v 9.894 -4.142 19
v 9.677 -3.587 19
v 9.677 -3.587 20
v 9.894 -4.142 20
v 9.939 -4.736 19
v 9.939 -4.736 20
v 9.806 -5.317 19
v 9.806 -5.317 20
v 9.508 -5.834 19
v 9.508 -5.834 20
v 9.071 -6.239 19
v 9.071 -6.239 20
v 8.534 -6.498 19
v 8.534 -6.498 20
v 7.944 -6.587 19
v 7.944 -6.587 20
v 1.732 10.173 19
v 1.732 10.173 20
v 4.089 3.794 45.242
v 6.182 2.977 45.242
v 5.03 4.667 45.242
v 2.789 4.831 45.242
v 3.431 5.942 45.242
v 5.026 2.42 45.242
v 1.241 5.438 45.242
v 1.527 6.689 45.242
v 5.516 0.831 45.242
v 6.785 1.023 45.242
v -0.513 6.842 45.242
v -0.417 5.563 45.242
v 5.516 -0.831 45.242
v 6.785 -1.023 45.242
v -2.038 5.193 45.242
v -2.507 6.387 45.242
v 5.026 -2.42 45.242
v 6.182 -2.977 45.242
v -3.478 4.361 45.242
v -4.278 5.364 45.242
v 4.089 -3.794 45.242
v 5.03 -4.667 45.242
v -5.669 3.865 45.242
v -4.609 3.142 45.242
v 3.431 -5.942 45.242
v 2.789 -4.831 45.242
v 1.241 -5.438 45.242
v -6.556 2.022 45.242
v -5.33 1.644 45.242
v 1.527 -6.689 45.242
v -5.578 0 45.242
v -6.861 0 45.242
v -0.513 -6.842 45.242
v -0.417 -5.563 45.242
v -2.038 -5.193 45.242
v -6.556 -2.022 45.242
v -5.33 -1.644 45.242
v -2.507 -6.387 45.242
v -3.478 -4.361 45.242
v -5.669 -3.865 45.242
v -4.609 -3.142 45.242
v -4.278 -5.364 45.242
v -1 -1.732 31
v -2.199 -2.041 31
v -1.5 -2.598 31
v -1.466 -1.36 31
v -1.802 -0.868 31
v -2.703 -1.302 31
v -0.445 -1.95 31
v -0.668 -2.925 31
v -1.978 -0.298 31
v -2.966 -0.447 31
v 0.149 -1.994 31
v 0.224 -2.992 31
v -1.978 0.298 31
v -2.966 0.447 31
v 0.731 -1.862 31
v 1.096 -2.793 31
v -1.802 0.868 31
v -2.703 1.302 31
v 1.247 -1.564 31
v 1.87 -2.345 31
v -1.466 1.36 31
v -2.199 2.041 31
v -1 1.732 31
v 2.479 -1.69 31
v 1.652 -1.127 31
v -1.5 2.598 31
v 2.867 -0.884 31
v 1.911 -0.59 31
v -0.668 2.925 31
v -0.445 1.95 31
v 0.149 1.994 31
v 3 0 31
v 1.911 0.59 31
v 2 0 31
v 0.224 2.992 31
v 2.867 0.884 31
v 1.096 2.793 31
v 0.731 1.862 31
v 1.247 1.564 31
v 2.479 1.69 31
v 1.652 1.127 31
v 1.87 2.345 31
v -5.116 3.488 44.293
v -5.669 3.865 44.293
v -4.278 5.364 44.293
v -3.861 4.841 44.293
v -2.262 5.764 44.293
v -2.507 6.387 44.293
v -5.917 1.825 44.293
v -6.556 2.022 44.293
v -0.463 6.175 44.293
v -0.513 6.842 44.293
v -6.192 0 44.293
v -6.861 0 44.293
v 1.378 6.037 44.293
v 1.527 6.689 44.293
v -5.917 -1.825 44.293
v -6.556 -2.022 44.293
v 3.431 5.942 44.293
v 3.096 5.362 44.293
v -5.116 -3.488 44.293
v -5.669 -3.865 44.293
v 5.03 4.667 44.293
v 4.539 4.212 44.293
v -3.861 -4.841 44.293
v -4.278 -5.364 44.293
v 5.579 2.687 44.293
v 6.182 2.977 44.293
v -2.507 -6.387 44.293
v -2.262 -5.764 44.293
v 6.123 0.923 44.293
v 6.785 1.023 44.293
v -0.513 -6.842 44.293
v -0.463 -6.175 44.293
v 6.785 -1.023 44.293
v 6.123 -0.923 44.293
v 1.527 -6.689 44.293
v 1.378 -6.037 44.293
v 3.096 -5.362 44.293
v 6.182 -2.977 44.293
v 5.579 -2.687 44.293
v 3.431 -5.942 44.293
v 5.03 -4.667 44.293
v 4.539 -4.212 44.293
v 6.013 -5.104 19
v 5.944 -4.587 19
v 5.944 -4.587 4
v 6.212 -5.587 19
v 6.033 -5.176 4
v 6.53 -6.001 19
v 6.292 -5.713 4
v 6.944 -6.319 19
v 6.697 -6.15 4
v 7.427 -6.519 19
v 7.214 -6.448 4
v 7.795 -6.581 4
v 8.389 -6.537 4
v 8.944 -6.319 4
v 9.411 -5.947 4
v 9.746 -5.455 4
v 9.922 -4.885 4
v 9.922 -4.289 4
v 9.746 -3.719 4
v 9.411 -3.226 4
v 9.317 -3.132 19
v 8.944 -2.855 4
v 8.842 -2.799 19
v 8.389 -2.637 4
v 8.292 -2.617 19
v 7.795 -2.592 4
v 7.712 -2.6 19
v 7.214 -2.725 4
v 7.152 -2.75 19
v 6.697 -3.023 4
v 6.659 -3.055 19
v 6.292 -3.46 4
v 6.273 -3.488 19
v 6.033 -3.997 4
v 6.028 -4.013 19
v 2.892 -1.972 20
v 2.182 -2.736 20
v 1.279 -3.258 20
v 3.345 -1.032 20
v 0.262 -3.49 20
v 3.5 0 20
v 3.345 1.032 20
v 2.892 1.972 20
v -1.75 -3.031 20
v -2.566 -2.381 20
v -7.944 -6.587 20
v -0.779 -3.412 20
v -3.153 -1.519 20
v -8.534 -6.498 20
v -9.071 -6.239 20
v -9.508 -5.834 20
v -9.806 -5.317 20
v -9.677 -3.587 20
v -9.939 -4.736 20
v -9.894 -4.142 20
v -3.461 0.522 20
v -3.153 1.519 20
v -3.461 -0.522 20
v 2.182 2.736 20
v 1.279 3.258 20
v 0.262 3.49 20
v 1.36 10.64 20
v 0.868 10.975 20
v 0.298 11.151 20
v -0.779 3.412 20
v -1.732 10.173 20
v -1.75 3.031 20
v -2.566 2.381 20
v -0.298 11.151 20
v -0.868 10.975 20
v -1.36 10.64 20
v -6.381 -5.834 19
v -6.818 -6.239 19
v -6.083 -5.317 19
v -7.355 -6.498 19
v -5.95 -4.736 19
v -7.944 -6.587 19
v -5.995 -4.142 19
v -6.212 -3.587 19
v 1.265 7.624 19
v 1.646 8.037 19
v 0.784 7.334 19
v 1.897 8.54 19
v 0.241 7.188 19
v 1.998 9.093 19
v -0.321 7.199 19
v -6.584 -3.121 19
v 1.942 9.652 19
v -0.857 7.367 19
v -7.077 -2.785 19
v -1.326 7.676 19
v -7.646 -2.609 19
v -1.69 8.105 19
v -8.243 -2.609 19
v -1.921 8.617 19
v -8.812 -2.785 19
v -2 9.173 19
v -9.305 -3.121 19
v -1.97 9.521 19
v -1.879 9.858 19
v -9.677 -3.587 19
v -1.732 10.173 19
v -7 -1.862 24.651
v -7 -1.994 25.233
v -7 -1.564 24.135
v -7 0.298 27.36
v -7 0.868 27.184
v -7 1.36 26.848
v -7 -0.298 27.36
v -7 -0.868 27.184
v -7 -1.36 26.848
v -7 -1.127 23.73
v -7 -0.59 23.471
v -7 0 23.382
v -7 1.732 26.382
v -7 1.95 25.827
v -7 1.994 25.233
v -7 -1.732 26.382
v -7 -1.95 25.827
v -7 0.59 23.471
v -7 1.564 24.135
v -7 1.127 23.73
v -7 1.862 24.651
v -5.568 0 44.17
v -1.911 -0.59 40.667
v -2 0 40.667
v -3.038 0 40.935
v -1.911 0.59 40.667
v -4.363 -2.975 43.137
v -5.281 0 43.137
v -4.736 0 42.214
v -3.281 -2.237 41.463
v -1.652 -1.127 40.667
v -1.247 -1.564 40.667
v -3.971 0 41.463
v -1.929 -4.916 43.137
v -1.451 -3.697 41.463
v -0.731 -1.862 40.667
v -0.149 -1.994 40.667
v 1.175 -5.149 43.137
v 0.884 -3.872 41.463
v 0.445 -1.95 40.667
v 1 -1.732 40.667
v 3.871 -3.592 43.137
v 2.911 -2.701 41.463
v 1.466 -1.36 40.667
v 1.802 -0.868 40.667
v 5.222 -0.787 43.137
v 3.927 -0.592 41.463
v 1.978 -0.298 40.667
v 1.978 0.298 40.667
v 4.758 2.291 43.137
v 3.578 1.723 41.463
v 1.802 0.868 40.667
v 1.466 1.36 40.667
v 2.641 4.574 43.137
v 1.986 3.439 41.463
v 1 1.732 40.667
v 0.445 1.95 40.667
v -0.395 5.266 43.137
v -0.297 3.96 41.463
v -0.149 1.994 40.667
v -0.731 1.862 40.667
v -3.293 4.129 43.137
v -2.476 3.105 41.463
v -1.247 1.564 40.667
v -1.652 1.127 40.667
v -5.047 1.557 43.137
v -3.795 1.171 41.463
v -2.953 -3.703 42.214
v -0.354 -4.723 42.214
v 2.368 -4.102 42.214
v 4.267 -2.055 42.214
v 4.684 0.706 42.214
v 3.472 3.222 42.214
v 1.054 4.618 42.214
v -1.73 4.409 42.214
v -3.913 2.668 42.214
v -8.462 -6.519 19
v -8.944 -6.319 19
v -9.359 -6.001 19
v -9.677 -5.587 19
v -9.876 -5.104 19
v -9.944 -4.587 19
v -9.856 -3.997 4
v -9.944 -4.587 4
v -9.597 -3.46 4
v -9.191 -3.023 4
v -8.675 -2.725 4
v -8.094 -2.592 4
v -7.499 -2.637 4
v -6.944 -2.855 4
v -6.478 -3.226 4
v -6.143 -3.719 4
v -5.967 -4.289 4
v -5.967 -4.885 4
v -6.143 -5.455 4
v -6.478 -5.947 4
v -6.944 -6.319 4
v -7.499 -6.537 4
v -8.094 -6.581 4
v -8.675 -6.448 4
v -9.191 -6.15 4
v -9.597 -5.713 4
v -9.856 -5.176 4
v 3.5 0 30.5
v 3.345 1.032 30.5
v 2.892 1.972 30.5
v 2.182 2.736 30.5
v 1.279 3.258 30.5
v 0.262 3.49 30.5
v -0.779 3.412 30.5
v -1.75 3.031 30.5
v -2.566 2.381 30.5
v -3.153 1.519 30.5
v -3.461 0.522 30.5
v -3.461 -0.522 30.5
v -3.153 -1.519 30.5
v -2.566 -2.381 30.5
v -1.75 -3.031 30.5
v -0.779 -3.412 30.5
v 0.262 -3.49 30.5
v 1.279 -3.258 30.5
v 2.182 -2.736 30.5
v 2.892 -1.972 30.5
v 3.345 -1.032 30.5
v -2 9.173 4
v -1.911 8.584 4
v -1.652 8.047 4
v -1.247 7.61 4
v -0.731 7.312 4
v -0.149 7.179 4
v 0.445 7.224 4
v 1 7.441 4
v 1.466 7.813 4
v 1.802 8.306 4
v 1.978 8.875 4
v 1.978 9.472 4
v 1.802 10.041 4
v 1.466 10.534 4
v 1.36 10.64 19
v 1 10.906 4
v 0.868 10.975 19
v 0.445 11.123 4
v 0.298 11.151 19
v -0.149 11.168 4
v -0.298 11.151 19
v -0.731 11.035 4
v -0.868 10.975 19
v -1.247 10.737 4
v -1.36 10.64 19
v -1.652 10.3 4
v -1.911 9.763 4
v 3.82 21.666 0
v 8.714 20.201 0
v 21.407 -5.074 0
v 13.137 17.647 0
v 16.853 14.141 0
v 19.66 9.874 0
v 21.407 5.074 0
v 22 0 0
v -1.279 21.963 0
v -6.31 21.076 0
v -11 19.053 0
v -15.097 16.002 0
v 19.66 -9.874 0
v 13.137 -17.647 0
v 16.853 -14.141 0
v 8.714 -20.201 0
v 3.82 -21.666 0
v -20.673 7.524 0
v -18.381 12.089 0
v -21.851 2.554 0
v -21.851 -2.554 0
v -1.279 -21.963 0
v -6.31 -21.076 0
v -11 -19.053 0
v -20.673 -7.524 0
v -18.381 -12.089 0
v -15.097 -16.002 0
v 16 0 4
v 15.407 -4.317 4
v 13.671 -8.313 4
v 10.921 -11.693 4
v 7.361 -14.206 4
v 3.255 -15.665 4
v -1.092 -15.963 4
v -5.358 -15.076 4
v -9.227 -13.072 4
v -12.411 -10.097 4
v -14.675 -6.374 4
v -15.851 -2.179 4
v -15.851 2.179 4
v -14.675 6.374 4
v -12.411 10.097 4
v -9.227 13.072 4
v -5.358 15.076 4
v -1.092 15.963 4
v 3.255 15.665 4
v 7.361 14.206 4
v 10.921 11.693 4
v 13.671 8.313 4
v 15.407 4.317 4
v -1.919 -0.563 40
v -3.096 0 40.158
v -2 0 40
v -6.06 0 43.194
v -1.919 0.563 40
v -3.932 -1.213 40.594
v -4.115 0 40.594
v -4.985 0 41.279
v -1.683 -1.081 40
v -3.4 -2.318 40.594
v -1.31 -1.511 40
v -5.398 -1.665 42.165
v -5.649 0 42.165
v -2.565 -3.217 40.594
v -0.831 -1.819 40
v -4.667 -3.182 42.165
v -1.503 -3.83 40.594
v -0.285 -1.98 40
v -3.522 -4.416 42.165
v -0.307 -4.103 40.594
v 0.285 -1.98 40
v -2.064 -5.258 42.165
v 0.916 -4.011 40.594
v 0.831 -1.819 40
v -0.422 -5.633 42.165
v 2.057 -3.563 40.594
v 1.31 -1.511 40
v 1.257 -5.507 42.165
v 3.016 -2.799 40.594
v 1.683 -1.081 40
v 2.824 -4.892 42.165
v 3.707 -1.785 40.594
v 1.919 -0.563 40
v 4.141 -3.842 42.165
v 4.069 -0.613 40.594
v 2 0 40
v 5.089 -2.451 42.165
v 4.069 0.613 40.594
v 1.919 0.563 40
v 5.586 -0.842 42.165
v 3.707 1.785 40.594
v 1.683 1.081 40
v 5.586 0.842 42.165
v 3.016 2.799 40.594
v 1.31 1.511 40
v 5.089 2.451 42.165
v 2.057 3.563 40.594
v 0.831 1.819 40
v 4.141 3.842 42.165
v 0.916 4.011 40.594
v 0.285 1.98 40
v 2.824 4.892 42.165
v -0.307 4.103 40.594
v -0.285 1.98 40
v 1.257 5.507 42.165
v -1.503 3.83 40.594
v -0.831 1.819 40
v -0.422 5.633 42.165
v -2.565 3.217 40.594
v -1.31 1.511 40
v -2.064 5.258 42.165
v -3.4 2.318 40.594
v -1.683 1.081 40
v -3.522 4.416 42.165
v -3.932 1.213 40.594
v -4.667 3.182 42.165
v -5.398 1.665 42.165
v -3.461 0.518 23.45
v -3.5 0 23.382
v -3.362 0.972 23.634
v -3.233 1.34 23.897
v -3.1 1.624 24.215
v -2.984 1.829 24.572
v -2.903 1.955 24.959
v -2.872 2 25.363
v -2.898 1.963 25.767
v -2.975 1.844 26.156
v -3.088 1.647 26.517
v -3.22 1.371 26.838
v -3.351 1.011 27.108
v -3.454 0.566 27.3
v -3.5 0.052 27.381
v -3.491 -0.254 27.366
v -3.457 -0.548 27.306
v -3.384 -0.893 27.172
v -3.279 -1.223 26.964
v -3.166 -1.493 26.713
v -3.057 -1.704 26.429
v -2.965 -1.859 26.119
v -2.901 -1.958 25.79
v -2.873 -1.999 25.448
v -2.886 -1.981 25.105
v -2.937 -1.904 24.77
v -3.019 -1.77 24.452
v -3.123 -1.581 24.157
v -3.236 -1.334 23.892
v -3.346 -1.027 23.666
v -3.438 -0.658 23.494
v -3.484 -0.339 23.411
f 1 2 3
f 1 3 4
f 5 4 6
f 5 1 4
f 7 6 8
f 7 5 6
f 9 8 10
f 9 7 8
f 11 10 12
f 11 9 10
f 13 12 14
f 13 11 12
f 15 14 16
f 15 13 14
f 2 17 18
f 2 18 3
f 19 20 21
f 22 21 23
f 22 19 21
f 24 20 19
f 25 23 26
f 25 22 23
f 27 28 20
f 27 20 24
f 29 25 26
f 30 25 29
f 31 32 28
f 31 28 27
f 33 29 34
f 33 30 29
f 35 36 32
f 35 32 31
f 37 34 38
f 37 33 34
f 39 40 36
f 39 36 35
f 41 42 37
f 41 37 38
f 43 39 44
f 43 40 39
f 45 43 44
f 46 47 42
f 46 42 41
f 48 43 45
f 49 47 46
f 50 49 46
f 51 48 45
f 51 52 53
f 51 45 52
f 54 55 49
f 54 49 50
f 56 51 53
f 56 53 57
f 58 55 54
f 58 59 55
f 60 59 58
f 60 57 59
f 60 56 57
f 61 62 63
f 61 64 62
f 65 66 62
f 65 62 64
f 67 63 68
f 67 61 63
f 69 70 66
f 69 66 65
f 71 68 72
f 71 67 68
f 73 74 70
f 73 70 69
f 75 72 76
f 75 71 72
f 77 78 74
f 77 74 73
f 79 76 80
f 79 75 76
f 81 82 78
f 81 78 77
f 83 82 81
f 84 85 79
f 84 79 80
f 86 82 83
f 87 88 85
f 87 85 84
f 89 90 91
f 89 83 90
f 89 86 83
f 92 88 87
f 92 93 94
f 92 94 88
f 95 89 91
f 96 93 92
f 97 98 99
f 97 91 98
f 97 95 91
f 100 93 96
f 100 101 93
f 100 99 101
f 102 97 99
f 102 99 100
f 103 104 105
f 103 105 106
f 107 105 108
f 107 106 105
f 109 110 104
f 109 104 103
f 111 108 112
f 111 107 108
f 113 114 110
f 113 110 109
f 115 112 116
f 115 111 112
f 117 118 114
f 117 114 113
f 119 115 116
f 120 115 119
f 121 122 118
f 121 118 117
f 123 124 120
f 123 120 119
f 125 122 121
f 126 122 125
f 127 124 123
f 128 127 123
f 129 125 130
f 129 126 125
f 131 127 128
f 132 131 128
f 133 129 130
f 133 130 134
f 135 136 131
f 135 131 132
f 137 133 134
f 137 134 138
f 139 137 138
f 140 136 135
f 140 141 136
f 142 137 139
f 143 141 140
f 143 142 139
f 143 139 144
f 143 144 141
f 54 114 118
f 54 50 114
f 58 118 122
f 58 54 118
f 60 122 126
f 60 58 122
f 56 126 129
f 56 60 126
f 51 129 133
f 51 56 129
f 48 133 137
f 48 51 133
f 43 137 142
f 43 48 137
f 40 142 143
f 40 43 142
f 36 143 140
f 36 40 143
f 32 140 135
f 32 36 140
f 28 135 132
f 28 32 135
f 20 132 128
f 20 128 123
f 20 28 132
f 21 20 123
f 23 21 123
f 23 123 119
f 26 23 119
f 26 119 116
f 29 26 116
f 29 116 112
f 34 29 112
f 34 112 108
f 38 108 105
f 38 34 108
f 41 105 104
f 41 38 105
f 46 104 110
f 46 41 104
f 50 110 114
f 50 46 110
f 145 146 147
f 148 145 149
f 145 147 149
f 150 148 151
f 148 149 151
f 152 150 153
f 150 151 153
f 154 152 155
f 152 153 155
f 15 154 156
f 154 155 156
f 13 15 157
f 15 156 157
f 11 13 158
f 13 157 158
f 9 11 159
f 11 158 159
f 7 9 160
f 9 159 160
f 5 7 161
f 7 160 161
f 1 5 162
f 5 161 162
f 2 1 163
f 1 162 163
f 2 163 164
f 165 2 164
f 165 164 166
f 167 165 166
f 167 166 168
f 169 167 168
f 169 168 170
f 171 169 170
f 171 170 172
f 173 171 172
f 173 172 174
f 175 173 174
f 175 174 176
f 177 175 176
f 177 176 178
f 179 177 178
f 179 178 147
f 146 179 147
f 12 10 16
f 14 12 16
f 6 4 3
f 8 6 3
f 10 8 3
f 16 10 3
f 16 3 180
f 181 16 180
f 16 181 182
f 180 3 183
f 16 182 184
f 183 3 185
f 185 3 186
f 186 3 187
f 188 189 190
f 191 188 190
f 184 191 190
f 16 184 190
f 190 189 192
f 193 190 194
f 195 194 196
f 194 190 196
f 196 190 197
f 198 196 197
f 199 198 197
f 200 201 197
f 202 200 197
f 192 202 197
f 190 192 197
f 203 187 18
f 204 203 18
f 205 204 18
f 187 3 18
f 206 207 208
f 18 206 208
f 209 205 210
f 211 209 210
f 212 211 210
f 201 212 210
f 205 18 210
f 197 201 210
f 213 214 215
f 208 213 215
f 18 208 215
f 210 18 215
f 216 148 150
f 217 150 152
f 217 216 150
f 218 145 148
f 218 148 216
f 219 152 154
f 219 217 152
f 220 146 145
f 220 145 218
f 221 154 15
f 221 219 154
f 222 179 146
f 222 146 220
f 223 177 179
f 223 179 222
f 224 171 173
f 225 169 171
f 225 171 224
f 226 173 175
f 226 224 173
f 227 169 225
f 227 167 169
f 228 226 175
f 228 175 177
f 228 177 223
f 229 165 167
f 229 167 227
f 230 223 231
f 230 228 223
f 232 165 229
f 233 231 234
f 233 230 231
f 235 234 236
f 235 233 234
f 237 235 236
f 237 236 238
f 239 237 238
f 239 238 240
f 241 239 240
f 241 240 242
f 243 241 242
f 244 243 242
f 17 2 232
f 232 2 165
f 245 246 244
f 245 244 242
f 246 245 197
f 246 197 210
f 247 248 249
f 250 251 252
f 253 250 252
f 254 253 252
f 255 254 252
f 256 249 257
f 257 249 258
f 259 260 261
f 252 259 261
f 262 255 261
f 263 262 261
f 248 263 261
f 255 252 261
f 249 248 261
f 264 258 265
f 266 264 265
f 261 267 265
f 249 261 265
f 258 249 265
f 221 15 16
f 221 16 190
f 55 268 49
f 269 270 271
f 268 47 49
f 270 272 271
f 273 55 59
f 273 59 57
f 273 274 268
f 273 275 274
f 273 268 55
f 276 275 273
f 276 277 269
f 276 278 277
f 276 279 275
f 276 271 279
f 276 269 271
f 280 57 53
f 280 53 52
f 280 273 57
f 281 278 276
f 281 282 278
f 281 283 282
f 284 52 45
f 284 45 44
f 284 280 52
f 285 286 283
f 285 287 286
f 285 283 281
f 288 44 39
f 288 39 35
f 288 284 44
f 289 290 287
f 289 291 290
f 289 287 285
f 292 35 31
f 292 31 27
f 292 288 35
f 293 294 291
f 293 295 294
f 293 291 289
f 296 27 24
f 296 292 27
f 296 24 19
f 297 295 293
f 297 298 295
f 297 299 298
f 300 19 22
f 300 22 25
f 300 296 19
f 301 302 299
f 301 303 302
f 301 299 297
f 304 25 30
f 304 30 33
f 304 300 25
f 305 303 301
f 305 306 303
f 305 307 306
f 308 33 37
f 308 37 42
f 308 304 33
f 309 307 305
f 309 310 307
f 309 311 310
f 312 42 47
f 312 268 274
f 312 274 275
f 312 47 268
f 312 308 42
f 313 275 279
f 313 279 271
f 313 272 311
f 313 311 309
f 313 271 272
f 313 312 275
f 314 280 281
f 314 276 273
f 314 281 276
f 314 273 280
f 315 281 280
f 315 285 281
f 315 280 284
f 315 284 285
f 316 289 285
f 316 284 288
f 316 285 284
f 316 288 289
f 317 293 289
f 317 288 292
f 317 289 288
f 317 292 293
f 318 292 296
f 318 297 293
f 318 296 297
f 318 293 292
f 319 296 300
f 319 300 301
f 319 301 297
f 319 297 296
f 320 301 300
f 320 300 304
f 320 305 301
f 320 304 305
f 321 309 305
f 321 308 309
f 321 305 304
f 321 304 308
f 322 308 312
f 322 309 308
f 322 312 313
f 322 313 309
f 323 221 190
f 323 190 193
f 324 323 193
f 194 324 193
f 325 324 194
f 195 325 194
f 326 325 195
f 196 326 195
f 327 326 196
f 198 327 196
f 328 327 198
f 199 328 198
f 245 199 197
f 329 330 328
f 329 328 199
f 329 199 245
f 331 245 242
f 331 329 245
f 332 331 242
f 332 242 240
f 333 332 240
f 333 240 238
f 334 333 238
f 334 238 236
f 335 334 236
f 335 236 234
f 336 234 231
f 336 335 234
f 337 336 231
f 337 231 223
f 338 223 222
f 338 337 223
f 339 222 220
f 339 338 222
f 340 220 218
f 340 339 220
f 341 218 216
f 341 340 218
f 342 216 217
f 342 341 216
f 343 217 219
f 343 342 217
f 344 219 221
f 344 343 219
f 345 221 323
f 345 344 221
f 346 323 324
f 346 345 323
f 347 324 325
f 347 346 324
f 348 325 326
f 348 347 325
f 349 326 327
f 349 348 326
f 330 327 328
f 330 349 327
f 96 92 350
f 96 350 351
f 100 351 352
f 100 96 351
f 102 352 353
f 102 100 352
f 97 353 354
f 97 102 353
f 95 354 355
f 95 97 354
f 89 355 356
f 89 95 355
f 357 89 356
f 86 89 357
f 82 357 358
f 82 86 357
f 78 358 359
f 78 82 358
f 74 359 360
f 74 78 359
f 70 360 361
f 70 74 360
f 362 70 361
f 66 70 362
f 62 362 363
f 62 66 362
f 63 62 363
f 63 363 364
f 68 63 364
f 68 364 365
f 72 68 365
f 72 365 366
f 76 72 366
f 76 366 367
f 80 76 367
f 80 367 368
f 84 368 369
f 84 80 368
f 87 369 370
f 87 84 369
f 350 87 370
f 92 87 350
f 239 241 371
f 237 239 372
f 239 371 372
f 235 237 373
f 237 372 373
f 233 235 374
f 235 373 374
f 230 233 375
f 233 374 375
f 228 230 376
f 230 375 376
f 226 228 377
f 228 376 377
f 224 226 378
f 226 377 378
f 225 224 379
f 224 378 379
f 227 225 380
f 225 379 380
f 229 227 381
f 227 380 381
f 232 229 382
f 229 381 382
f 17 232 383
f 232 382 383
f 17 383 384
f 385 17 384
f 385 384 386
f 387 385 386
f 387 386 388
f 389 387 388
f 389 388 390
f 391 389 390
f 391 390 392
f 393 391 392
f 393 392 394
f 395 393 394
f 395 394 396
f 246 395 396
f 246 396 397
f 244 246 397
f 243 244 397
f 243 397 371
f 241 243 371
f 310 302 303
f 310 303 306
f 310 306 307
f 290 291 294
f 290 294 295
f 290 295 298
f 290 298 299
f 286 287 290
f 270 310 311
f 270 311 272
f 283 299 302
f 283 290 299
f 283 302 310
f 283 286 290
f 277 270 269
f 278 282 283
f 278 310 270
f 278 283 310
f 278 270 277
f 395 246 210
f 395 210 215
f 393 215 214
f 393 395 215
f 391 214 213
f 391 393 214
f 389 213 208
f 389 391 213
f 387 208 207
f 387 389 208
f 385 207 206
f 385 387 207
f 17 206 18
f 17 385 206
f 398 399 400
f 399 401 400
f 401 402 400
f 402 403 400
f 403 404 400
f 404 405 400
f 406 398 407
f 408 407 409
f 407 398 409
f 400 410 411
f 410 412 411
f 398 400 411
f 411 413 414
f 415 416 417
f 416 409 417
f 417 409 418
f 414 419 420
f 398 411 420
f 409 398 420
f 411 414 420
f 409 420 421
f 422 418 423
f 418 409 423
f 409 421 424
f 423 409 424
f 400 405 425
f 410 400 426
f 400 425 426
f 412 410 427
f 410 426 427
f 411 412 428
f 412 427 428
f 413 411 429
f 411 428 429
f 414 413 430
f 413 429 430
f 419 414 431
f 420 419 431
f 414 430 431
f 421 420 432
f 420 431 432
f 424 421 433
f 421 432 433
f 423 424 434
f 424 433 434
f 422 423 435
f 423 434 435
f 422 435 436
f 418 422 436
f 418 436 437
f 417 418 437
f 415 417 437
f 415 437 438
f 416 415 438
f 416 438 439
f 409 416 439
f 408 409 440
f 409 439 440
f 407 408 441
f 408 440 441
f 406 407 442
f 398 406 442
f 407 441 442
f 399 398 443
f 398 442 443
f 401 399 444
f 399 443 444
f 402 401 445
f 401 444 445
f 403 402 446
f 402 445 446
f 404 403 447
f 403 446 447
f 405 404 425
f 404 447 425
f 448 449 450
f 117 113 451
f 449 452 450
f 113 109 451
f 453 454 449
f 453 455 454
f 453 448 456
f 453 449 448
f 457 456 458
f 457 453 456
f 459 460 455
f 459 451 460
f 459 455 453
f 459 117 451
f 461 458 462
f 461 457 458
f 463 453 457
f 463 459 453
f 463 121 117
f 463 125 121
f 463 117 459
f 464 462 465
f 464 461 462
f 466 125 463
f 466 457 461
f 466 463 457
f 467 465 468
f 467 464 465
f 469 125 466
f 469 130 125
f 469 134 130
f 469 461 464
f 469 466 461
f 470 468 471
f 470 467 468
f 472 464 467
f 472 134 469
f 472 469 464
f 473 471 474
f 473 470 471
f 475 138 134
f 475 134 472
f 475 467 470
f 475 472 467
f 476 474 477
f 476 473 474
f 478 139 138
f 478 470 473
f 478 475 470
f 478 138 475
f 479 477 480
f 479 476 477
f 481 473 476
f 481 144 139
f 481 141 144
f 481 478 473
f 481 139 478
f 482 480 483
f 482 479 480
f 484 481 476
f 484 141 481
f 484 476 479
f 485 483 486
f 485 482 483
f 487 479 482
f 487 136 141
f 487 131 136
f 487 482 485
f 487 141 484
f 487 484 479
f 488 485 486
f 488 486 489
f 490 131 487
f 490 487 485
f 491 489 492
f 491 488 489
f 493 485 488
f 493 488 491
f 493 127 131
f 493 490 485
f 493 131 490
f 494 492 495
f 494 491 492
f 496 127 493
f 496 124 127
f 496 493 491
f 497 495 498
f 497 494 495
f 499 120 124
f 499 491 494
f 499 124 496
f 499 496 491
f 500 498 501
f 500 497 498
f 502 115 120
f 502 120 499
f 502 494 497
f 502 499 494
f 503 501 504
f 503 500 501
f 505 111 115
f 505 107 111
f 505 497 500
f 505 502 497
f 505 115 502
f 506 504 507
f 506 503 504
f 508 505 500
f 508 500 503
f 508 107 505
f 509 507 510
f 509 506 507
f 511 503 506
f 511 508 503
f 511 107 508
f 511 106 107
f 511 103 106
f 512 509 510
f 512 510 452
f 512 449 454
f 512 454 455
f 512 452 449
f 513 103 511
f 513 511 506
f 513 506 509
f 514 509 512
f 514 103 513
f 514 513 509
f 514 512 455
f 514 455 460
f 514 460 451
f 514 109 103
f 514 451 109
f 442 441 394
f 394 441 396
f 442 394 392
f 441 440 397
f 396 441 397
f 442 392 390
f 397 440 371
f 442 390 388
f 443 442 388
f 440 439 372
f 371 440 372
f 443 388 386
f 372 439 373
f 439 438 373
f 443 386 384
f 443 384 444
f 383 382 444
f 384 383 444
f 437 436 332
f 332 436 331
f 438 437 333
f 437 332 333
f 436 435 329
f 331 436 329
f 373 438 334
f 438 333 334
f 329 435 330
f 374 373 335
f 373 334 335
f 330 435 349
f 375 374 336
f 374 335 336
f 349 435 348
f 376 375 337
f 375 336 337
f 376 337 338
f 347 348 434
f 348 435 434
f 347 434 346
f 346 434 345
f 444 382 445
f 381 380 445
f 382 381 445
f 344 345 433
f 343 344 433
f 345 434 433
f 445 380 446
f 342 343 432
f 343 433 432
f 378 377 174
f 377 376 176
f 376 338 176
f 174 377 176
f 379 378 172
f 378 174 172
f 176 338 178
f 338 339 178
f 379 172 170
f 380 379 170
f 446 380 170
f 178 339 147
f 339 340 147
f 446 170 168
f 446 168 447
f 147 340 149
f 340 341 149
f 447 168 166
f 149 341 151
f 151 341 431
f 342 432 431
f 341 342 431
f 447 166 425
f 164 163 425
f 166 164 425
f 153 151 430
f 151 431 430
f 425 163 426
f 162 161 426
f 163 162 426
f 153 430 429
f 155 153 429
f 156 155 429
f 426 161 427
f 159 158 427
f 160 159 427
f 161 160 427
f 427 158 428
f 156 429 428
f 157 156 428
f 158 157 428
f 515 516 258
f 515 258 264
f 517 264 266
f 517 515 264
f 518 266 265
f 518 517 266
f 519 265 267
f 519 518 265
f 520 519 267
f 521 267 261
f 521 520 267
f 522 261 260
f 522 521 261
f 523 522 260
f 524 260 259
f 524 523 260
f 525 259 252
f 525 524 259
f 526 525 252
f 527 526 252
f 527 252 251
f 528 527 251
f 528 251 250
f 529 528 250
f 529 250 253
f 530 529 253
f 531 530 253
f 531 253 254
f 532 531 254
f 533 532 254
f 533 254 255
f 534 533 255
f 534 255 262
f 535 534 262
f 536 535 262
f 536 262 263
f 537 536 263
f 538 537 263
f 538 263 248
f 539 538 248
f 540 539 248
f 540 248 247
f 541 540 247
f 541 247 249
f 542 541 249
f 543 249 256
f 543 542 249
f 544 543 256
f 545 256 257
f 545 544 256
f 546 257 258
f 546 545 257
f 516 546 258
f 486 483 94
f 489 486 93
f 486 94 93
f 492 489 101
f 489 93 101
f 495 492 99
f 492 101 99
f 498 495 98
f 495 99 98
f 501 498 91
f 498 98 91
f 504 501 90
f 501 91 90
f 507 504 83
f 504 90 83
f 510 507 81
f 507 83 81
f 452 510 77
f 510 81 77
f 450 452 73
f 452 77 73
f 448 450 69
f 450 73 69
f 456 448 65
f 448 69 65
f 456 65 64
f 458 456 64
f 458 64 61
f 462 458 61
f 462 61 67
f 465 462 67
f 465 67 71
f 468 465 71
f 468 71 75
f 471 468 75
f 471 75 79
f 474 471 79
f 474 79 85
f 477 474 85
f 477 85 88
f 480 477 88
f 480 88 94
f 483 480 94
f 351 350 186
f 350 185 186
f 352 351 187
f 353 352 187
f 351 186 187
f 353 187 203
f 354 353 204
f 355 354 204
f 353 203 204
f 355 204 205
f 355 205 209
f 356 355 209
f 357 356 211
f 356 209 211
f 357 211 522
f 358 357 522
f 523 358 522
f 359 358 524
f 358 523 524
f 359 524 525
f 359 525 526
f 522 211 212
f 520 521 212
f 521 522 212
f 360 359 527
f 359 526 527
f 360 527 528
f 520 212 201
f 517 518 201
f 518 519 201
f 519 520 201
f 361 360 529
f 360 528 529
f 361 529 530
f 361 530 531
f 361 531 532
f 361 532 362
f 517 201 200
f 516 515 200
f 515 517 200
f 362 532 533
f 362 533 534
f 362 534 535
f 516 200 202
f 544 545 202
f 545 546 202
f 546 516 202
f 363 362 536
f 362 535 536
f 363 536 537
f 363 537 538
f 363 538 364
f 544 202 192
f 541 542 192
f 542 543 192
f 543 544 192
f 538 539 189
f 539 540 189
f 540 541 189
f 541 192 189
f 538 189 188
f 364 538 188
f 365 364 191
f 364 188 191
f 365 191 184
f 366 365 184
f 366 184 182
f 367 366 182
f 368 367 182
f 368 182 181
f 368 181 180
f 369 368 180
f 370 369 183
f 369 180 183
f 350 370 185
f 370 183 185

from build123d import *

# Parameters (mm, degrees)
SKETCH3_R           = 2
BOSS_EXTRUDE1_DEPTH = 15
BOSS_EXTRUDE2_DEPTH = 1
SKETCH6_R           = 3.5
BOSS_EXTRUDE3_DEPTH = 11
SKETCH7_R           = 2
BOSS_EXTRUDE4_DEPTH = 9
CHAMFER2_SIZE       = 0.5
SKETCH9_R           = 2
BOSS_EXTRUDE5_DEPTH = 7


with BuildPart() as part:
    # Sketch2 → Revolve1 (revolve)
    with BuildSketch(Plane(origin=(0, 0, 0), x_dir=(0, 0, -1), z_dir=(1, 0, 0)), mode=Mode.PRIVATE) as revolve1_sk:
        Polygon((0, 0), (0, 22), (-4, 16), (-4, 0), align=None)
    revolve(revolve1_sk.sketch.rotate(Axis((0, 0, 4), (0, 0, -1)), 90), axis=Axis((0, 0, 4), (0, 0, -1)))

    # Sketch3 → Boss-Extrude1 (add)
    with BuildSketch(Plane.XY.offset(4)):
        with Locations(Location((7.94445625, -4.586733955, 0), (0, 0, 180))):
            Circle(SKETCH3_R)
        with Locations(Location((-7.94445625, -4.586733955, 0), (0, 0, 180))):
            Circle(SKETCH3_R)
        with Locations(Location((0, 9.173467909, 0), (0, 0, 180))):
            Circle(SKETCH3_R)
    extrude(amount=BOSS_EXTRUDE1_DEPTH)

    # Sketch4 → Boss-Extrude2 (add)
    with BuildSketch(Plane.XY.offset(19)):
        with BuildLine():
            Line((1.732050808, 10.173467909), (9.676507058, -3.586733955))
            ThreePointArc((9.676507058, -3.586733955), (9.676507058, -5.586733955), (7.94445625, -6.586733955))
            Line((7.94445625, -6.586733955), (-7.94445625, -6.586733955))
            ThreePointArc((-7.94445625, -6.586733955), (-9.676507058, -5.586733955), (-9.676507058, -3.586733955))
            Line((-9.676507058, -3.586733955), (-1.732050808, 10.173467909))
            ThreePointArc((-1.732050808, 10.173467909), (0, 11.173467909), (1.732050808, 10.173467909))
        make_face()
    extrude(amount=BOSS_EXTRUDE2_DEPTH)

    # Sketch6 → Boss-Extrude3 (add)
    with BuildSketch(Plane.XY.offset(20)):
        Circle(SKETCH6_R)
    extrude(amount=BOSS_EXTRUDE3_DEPTH)

    # Sketch7 → Boss-Extrude4 (add)
    with BuildSketch(Plane.XY.offset(31)):
        Circle(SKETCH7_R)
    extrude(amount=BOSS_EXTRUDE4_DEPTH)

    # Chamfer2
    chamfer2_edges = [part.edges().sort_by_distance(p)[0] for p in [
        (-3.5, 0, 31),
    ]]
    chamfer(chamfer2_edges, length=CHAMFER2_SIZE)

    # Sketch8 → Revolve2 (revolve)
    with BuildSketch(Plane(origin=(0, 0, 0), x_dir=(1, 0, 0), z_dir=(0, 1, 0)), mode=Mode.PRIVATE) as revolve2_sk:
        with BuildLine():
            Line((0, -40), (2, -40))
            ThreePointArc((2, -40), (4.985127596, -41.278519641), (6.191881653, -44.293373514))
            Line((6.191881653, -44.293373514), (6.861274265, -44.293373514))
            Line((6.861274265, -44.293373514), (6.861274265, -45.241679714))
            Line((6.861274265, -45.241679714), (5.57827176, -45.241679714))
            ThreePointArc((5.57827176, -45.241679714), (4.736480165, -42.213503946), (2, -40.66749687))
            Line((2, -40.66749687), (0, -40.66749687))
            Line((0, -40.66749687), (0, -40))
        make_face()
    revolve(revolve2_sk.sketch.rotate(Axis((0, 0, 40), (0, 0, 1)), 180), axis=Axis((0, 0, 40), (0, 0, 1)))

    # Sketch9 → Boss-Extrude5 (add)
    with BuildSketch(Plane(origin=(0, 0, 0), x_dir=(0, 0, -1), z_dir=(1, 0, 0))):
        with Locations((-25.382084378, 0)):
            Circle(SKETCH9_R)
    extrude(amount=-BOSS_EXTRUDE5_DEPTH)


solid = part.part
